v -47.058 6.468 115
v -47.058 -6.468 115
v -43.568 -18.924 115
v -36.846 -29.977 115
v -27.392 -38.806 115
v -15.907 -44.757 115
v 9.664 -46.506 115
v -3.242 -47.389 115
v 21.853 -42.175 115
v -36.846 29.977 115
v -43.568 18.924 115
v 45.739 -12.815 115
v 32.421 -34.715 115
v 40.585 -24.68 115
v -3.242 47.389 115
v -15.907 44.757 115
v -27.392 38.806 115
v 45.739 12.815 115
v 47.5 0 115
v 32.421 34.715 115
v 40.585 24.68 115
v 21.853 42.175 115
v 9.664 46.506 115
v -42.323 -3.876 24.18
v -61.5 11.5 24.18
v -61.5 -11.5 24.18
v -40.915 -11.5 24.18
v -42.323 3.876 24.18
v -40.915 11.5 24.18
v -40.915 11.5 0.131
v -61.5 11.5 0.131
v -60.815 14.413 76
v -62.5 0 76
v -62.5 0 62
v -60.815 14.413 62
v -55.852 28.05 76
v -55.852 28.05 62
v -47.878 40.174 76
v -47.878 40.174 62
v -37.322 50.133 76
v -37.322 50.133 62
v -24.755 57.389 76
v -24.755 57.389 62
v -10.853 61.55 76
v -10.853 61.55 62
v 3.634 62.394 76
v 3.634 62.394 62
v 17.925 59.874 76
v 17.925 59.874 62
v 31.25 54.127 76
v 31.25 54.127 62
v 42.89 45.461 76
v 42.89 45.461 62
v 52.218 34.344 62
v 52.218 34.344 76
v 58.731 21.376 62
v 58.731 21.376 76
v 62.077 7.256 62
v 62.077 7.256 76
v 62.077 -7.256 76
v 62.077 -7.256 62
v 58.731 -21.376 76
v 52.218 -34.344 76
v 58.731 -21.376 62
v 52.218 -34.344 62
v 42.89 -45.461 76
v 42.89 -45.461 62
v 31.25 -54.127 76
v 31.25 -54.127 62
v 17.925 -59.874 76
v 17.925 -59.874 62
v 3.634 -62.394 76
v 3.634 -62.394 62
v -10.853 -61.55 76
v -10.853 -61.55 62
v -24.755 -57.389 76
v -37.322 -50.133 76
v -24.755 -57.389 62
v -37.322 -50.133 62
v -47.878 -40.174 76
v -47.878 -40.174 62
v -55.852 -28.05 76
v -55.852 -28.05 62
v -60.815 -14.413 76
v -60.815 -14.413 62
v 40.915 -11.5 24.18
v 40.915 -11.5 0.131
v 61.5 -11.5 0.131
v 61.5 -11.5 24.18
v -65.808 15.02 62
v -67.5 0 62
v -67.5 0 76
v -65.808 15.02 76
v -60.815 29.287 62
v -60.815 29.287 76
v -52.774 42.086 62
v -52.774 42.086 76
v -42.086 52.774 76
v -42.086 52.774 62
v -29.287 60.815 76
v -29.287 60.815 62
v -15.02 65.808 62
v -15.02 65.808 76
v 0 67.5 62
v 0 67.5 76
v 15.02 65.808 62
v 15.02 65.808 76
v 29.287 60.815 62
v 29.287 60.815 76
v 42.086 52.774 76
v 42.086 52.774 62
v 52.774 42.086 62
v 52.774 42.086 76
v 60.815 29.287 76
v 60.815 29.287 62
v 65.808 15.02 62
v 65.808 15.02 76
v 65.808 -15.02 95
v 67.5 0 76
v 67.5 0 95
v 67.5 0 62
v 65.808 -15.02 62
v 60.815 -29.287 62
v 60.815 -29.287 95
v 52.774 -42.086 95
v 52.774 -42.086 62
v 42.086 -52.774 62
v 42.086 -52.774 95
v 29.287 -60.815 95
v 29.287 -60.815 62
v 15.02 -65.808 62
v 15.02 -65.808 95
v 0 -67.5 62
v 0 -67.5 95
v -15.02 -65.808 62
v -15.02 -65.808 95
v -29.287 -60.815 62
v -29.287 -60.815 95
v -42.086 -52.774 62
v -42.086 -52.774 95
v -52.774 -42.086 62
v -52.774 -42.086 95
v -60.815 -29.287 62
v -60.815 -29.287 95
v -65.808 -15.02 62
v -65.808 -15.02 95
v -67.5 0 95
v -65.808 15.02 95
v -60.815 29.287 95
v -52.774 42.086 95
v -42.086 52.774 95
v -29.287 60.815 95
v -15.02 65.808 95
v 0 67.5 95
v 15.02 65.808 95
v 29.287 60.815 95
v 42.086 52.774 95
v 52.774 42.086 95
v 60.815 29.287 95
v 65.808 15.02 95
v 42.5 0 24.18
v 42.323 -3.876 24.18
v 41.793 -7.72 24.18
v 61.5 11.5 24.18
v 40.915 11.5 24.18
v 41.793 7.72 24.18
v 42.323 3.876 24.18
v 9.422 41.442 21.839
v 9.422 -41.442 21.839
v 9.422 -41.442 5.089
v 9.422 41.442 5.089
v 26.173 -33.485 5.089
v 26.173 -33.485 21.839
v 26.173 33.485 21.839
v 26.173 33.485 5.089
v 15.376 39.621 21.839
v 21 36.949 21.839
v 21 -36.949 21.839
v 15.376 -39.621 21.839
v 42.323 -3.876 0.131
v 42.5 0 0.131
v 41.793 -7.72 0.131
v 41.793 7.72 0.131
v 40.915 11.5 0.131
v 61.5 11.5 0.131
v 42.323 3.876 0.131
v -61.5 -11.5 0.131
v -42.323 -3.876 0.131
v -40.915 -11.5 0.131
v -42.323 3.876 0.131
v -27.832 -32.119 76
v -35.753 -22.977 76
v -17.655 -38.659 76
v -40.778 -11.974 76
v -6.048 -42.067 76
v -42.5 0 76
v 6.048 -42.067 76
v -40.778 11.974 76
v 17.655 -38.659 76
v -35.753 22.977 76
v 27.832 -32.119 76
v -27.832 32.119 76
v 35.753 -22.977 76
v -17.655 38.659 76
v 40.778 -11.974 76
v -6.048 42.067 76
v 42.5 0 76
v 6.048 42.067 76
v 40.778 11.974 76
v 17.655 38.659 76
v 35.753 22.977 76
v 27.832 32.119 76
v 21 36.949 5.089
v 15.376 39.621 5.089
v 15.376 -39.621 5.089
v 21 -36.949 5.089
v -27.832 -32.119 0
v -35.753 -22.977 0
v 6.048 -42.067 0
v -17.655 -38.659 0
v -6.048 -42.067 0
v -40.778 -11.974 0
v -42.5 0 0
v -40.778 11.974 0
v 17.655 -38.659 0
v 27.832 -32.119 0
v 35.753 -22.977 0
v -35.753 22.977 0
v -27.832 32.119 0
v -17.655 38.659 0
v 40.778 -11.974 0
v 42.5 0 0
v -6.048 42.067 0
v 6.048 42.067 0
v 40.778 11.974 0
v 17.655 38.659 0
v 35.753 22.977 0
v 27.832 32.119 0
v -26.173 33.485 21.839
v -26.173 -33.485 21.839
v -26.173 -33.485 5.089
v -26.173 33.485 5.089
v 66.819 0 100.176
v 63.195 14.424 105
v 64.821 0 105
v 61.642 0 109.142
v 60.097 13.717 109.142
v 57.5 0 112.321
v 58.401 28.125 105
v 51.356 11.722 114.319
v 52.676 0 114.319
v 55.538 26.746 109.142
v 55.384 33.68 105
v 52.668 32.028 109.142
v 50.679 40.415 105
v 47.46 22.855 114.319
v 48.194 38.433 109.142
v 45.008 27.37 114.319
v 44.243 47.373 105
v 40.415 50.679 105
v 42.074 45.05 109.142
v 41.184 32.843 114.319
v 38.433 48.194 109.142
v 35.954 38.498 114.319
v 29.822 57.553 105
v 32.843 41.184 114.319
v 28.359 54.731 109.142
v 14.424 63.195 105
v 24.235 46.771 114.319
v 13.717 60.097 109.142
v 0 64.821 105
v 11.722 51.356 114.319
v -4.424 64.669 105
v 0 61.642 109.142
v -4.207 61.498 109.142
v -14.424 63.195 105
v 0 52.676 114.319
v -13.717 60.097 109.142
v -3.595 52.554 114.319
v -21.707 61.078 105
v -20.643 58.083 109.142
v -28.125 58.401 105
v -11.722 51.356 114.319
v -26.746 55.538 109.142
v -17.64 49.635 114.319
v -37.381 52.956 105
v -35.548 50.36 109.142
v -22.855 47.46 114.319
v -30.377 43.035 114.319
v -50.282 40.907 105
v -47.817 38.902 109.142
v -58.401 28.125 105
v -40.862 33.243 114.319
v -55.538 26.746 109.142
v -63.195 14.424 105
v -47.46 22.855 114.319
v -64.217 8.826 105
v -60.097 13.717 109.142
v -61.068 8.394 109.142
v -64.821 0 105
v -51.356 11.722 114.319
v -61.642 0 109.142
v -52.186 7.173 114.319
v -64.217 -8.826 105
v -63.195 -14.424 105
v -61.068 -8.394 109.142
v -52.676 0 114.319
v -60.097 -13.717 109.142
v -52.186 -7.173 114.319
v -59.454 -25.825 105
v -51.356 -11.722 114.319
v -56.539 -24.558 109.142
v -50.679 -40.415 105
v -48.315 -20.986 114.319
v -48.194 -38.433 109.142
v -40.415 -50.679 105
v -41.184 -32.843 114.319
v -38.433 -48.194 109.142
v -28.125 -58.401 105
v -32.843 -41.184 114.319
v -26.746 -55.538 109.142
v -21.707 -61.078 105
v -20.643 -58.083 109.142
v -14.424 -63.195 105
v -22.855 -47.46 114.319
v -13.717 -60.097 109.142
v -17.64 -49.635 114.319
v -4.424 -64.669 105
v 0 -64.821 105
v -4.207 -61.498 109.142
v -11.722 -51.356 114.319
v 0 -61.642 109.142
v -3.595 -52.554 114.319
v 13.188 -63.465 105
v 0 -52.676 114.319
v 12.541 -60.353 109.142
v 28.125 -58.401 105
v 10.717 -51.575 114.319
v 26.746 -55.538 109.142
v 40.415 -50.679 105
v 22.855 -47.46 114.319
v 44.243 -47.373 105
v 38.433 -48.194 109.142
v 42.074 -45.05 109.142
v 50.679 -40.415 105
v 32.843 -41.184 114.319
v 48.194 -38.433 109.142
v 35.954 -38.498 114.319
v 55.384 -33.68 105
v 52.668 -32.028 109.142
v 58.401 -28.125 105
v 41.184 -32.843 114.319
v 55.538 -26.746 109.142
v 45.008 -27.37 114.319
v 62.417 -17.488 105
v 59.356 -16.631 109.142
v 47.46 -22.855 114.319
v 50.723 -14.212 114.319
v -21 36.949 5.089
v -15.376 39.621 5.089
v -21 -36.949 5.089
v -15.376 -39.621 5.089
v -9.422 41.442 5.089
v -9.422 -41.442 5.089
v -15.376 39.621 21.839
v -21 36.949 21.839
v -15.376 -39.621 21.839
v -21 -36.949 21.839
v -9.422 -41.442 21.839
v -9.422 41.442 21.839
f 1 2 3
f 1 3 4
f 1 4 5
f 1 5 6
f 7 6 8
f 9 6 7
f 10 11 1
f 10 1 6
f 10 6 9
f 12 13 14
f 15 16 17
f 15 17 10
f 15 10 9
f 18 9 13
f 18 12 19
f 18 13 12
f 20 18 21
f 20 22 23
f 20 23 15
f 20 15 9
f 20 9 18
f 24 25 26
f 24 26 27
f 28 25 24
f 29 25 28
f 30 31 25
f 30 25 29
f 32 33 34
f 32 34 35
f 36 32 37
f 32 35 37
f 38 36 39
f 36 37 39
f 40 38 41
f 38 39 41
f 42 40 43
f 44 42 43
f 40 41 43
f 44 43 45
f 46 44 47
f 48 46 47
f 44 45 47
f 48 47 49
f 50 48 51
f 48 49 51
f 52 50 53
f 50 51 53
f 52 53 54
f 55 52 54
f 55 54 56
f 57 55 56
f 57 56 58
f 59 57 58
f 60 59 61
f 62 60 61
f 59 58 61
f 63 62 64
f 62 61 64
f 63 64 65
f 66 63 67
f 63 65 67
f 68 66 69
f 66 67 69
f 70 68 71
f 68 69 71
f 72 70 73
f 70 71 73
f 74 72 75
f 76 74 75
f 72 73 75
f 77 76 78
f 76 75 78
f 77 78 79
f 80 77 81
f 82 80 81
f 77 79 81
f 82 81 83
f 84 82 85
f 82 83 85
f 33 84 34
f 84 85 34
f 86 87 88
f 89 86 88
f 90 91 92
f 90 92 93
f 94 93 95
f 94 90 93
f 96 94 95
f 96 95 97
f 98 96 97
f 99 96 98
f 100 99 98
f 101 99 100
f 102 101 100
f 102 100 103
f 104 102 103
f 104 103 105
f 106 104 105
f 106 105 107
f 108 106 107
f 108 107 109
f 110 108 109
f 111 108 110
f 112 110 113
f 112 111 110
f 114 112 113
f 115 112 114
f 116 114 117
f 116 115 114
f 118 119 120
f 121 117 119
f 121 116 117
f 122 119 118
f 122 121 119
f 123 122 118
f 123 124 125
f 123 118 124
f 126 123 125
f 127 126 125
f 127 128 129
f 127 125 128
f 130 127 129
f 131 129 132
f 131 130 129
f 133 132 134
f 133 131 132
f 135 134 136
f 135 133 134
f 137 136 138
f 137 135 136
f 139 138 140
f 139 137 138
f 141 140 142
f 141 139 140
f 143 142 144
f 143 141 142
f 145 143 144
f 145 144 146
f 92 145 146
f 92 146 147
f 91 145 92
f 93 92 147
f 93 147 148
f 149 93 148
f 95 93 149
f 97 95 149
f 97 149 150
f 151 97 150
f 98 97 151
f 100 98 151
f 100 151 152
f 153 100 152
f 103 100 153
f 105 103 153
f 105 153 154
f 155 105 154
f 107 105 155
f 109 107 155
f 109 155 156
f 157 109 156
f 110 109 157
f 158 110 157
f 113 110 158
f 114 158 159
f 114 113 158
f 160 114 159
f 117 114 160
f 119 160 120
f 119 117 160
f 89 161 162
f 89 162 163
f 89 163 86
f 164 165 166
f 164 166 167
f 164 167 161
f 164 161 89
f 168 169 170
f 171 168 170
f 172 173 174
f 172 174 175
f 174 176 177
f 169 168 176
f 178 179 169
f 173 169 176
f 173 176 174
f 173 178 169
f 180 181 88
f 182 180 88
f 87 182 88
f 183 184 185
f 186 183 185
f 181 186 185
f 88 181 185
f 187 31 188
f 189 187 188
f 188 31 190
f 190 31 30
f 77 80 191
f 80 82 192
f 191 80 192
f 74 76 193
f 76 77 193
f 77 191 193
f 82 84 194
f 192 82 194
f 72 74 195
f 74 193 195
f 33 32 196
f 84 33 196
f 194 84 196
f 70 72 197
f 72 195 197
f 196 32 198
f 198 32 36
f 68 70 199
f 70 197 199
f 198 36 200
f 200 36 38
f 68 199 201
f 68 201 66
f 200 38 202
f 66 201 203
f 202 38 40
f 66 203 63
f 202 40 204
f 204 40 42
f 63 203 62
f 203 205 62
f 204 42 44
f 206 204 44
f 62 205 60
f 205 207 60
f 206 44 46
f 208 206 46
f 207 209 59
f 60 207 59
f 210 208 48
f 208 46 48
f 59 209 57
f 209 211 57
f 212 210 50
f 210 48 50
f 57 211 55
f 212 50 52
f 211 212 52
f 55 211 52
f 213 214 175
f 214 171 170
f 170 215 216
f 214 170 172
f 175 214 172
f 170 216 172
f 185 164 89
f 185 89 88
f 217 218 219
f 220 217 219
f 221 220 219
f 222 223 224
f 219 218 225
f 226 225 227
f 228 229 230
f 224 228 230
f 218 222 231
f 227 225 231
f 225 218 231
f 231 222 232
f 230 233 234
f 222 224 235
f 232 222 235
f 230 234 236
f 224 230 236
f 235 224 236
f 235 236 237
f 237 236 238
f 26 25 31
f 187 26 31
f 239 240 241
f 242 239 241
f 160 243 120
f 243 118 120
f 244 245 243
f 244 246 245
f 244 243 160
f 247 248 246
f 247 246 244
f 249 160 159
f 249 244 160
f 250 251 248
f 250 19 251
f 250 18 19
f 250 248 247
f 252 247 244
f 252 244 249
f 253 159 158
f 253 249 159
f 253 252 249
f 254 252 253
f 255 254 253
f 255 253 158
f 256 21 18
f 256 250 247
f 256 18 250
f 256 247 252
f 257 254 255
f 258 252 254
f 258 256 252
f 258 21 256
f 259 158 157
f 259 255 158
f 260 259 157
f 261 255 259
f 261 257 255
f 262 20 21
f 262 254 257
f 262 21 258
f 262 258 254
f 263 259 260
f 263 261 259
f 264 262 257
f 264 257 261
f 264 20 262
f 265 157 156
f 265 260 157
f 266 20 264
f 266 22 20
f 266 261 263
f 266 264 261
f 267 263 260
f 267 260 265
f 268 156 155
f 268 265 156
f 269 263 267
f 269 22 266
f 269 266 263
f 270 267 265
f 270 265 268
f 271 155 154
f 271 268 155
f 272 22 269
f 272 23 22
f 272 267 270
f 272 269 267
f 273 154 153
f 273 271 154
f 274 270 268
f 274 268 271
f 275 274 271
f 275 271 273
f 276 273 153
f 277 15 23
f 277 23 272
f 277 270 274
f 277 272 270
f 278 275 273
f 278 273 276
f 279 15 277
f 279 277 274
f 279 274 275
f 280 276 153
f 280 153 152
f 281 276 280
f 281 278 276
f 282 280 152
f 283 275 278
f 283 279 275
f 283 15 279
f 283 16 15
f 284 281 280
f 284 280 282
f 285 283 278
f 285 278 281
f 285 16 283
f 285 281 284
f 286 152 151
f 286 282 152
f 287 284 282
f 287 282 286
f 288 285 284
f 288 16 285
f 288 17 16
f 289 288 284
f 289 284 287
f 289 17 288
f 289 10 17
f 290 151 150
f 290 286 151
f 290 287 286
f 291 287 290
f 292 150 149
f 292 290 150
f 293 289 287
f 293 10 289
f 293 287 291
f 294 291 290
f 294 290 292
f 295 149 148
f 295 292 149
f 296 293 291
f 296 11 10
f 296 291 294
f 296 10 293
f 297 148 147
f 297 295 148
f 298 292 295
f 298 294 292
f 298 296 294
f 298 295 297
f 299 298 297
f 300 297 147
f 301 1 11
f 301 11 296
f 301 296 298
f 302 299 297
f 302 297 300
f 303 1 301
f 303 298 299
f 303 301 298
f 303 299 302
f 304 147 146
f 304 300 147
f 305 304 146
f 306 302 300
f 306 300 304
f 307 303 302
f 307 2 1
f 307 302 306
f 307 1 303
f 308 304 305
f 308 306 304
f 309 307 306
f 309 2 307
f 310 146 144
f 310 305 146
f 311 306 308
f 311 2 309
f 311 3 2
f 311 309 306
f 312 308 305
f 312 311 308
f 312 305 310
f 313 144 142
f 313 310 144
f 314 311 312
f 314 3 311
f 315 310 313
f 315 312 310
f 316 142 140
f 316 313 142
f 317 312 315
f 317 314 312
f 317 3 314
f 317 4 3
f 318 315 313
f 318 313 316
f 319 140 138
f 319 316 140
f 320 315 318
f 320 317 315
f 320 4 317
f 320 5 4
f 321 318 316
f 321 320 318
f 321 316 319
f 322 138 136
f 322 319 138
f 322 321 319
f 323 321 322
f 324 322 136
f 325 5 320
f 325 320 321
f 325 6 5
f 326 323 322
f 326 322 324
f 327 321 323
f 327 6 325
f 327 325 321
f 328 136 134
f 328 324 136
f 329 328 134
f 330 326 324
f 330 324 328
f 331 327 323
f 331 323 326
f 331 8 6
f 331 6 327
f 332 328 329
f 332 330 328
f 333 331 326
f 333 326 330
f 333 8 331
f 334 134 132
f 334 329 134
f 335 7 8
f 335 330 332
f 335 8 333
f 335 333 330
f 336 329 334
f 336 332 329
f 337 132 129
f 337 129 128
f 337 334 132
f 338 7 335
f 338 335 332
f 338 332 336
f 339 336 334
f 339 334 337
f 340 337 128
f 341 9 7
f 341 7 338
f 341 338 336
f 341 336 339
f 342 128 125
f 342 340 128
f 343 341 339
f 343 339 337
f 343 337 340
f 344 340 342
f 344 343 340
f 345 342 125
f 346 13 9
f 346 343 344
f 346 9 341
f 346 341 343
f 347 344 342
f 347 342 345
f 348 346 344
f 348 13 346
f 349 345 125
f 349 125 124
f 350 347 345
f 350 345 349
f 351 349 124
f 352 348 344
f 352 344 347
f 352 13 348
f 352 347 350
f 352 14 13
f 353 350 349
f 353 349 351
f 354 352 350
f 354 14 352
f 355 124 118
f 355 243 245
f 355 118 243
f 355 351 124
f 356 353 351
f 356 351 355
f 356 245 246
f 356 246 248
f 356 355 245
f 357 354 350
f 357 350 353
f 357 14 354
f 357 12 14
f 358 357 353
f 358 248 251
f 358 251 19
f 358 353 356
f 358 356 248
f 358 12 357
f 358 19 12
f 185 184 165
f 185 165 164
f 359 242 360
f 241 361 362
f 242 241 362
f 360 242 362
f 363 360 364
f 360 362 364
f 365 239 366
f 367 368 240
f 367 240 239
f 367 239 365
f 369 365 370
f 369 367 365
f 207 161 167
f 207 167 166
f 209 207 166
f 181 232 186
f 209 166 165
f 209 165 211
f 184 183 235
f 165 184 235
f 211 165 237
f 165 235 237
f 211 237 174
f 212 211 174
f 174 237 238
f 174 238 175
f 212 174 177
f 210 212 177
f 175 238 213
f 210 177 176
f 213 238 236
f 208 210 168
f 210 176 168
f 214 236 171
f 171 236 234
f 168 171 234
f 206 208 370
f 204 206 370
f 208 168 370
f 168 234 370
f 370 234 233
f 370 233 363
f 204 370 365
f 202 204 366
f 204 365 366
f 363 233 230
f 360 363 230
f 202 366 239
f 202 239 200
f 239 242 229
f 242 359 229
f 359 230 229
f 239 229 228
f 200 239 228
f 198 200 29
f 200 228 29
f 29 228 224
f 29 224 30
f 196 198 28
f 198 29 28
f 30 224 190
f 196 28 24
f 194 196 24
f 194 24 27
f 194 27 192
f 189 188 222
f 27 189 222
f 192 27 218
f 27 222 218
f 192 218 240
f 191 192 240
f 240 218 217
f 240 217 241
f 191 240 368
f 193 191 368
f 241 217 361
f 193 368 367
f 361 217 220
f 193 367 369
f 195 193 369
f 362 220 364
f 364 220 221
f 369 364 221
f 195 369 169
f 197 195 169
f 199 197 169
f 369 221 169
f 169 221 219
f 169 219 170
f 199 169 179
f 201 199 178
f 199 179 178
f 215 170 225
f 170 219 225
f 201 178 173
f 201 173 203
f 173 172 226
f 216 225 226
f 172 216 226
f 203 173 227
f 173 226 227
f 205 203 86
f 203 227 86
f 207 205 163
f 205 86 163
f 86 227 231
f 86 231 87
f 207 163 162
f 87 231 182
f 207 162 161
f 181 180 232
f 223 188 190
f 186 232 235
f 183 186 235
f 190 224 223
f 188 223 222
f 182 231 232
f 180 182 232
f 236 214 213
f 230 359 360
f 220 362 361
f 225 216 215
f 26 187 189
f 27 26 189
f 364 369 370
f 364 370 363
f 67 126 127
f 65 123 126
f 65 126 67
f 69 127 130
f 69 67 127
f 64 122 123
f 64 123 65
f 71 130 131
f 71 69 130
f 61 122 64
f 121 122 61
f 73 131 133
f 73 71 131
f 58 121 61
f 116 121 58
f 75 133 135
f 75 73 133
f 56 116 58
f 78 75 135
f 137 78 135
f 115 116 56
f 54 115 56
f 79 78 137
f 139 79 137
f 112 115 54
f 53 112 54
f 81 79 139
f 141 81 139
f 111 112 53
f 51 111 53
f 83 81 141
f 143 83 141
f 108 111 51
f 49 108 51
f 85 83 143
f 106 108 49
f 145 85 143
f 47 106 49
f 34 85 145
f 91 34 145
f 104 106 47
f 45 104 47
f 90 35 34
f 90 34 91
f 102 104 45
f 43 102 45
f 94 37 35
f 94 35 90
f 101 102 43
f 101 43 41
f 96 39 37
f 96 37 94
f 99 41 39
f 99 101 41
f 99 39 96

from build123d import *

# Parameters (mm, degrees)
SKETCH1_R               = 42.5
BOSS_EXTRUDE1_DEPTH     = 76
SKETCH2_R               = 67.5
BOSS_EXTRUDE2_DEPTH     = 39
FILLET1_R               = 20
BOSS_EXTRUDE3_START     = 14
SKETCH3_R               = 67.5
SKETCH3_R_2             = 62.5
BOSS_EXTRUDE3_DEPTH     = 14
SKETCH4_W               = 123
SKETCH4_H               = 24.049182643
BOSS_EXTRUDE4_DEPTH     = 11.5
CUT_EXTRUDE1_DEPTH      = 150.457351776
CUT_EXTRUDE1_DEPTH_BACK = 150.457351776
SKETCH5_W               = 16.750654132
SKETCH5_H               = 16.750654132


with BuildPart() as part:
    # Sketch1 → Boss-Extrude1 (new body)
    with BuildSketch(Plane.XY):
        Circle(SKETCH1_R)
    extrude(amount=BOSS_EXTRUDE1_DEPTH)

    # Sketch2 → Boss-Extrude2 (add)
    with BuildSketch(Plane.XY.offset(76)):
        Circle(SKETCH2_R)
    extrude(amount=BOSS_EXTRUDE2_DEPTH)

    # Fillet1
    fillet1_edges = [part.edges().sort_by_distance(p)[0] for p in [
        (-67.5, 0, 115),
    ]]
    fillet(fillet1_edges, radius=FILLET1_R)

    # Sketch3 → Boss-Extrude3 (add)
    with BuildSketch(Plane(origin=(0, 0, 76), x_dir=(-1, 0, 0), z_dir=(0, 0, -1)).offset(BOSS_EXTRUDE3_START)):
        Circle(SKETCH3_R)
        Circle(SKETCH3_R_2, mode=Mode.SUBTRACT)
    extrude(amount=-BOSS_EXTRUDE3_DEPTH)

    # Sketch4 → Boss-Extrude4 (add, symmetric)
    with BuildSketch(Plane(origin=(0, 0, 0), x_dir=(1, 0, 0), z_dir=(0, 1, 0))):
        with Locations((0, -12.155455807)):
            Rectangle(SKETCH4_W, SKETCH4_H)
    extrude(amount=BOSS_EXTRUDE4_DEPTH, both=True)

    # Sketch5 → Cut-Extrude1 (cut, two sides: drawn at the far end of the back side and taken through both)
    with BuildSketch(Plane(origin=(0, 0, 0), x_dir=(1, 0, 0), z_dir=(0, 1, 0)).offset(-CUT_EXTRUDE1_DEPTH_BACK)):
        with Locations((-17.797570015, -13.464100661)):
            Rectangle(SKETCH5_W, SKETCH5_H)
        with Locations((17.797570015, -13.464100661)):
            Rectangle(SKETCH5_W, SKETCH5_H)
    extrude(amount=CUT_EXTRUDE1_DEPTH + CUT_EXTRUDE1_DEPTH_BACK, mode=Mode.SUBTRACT)


solid = part.part
